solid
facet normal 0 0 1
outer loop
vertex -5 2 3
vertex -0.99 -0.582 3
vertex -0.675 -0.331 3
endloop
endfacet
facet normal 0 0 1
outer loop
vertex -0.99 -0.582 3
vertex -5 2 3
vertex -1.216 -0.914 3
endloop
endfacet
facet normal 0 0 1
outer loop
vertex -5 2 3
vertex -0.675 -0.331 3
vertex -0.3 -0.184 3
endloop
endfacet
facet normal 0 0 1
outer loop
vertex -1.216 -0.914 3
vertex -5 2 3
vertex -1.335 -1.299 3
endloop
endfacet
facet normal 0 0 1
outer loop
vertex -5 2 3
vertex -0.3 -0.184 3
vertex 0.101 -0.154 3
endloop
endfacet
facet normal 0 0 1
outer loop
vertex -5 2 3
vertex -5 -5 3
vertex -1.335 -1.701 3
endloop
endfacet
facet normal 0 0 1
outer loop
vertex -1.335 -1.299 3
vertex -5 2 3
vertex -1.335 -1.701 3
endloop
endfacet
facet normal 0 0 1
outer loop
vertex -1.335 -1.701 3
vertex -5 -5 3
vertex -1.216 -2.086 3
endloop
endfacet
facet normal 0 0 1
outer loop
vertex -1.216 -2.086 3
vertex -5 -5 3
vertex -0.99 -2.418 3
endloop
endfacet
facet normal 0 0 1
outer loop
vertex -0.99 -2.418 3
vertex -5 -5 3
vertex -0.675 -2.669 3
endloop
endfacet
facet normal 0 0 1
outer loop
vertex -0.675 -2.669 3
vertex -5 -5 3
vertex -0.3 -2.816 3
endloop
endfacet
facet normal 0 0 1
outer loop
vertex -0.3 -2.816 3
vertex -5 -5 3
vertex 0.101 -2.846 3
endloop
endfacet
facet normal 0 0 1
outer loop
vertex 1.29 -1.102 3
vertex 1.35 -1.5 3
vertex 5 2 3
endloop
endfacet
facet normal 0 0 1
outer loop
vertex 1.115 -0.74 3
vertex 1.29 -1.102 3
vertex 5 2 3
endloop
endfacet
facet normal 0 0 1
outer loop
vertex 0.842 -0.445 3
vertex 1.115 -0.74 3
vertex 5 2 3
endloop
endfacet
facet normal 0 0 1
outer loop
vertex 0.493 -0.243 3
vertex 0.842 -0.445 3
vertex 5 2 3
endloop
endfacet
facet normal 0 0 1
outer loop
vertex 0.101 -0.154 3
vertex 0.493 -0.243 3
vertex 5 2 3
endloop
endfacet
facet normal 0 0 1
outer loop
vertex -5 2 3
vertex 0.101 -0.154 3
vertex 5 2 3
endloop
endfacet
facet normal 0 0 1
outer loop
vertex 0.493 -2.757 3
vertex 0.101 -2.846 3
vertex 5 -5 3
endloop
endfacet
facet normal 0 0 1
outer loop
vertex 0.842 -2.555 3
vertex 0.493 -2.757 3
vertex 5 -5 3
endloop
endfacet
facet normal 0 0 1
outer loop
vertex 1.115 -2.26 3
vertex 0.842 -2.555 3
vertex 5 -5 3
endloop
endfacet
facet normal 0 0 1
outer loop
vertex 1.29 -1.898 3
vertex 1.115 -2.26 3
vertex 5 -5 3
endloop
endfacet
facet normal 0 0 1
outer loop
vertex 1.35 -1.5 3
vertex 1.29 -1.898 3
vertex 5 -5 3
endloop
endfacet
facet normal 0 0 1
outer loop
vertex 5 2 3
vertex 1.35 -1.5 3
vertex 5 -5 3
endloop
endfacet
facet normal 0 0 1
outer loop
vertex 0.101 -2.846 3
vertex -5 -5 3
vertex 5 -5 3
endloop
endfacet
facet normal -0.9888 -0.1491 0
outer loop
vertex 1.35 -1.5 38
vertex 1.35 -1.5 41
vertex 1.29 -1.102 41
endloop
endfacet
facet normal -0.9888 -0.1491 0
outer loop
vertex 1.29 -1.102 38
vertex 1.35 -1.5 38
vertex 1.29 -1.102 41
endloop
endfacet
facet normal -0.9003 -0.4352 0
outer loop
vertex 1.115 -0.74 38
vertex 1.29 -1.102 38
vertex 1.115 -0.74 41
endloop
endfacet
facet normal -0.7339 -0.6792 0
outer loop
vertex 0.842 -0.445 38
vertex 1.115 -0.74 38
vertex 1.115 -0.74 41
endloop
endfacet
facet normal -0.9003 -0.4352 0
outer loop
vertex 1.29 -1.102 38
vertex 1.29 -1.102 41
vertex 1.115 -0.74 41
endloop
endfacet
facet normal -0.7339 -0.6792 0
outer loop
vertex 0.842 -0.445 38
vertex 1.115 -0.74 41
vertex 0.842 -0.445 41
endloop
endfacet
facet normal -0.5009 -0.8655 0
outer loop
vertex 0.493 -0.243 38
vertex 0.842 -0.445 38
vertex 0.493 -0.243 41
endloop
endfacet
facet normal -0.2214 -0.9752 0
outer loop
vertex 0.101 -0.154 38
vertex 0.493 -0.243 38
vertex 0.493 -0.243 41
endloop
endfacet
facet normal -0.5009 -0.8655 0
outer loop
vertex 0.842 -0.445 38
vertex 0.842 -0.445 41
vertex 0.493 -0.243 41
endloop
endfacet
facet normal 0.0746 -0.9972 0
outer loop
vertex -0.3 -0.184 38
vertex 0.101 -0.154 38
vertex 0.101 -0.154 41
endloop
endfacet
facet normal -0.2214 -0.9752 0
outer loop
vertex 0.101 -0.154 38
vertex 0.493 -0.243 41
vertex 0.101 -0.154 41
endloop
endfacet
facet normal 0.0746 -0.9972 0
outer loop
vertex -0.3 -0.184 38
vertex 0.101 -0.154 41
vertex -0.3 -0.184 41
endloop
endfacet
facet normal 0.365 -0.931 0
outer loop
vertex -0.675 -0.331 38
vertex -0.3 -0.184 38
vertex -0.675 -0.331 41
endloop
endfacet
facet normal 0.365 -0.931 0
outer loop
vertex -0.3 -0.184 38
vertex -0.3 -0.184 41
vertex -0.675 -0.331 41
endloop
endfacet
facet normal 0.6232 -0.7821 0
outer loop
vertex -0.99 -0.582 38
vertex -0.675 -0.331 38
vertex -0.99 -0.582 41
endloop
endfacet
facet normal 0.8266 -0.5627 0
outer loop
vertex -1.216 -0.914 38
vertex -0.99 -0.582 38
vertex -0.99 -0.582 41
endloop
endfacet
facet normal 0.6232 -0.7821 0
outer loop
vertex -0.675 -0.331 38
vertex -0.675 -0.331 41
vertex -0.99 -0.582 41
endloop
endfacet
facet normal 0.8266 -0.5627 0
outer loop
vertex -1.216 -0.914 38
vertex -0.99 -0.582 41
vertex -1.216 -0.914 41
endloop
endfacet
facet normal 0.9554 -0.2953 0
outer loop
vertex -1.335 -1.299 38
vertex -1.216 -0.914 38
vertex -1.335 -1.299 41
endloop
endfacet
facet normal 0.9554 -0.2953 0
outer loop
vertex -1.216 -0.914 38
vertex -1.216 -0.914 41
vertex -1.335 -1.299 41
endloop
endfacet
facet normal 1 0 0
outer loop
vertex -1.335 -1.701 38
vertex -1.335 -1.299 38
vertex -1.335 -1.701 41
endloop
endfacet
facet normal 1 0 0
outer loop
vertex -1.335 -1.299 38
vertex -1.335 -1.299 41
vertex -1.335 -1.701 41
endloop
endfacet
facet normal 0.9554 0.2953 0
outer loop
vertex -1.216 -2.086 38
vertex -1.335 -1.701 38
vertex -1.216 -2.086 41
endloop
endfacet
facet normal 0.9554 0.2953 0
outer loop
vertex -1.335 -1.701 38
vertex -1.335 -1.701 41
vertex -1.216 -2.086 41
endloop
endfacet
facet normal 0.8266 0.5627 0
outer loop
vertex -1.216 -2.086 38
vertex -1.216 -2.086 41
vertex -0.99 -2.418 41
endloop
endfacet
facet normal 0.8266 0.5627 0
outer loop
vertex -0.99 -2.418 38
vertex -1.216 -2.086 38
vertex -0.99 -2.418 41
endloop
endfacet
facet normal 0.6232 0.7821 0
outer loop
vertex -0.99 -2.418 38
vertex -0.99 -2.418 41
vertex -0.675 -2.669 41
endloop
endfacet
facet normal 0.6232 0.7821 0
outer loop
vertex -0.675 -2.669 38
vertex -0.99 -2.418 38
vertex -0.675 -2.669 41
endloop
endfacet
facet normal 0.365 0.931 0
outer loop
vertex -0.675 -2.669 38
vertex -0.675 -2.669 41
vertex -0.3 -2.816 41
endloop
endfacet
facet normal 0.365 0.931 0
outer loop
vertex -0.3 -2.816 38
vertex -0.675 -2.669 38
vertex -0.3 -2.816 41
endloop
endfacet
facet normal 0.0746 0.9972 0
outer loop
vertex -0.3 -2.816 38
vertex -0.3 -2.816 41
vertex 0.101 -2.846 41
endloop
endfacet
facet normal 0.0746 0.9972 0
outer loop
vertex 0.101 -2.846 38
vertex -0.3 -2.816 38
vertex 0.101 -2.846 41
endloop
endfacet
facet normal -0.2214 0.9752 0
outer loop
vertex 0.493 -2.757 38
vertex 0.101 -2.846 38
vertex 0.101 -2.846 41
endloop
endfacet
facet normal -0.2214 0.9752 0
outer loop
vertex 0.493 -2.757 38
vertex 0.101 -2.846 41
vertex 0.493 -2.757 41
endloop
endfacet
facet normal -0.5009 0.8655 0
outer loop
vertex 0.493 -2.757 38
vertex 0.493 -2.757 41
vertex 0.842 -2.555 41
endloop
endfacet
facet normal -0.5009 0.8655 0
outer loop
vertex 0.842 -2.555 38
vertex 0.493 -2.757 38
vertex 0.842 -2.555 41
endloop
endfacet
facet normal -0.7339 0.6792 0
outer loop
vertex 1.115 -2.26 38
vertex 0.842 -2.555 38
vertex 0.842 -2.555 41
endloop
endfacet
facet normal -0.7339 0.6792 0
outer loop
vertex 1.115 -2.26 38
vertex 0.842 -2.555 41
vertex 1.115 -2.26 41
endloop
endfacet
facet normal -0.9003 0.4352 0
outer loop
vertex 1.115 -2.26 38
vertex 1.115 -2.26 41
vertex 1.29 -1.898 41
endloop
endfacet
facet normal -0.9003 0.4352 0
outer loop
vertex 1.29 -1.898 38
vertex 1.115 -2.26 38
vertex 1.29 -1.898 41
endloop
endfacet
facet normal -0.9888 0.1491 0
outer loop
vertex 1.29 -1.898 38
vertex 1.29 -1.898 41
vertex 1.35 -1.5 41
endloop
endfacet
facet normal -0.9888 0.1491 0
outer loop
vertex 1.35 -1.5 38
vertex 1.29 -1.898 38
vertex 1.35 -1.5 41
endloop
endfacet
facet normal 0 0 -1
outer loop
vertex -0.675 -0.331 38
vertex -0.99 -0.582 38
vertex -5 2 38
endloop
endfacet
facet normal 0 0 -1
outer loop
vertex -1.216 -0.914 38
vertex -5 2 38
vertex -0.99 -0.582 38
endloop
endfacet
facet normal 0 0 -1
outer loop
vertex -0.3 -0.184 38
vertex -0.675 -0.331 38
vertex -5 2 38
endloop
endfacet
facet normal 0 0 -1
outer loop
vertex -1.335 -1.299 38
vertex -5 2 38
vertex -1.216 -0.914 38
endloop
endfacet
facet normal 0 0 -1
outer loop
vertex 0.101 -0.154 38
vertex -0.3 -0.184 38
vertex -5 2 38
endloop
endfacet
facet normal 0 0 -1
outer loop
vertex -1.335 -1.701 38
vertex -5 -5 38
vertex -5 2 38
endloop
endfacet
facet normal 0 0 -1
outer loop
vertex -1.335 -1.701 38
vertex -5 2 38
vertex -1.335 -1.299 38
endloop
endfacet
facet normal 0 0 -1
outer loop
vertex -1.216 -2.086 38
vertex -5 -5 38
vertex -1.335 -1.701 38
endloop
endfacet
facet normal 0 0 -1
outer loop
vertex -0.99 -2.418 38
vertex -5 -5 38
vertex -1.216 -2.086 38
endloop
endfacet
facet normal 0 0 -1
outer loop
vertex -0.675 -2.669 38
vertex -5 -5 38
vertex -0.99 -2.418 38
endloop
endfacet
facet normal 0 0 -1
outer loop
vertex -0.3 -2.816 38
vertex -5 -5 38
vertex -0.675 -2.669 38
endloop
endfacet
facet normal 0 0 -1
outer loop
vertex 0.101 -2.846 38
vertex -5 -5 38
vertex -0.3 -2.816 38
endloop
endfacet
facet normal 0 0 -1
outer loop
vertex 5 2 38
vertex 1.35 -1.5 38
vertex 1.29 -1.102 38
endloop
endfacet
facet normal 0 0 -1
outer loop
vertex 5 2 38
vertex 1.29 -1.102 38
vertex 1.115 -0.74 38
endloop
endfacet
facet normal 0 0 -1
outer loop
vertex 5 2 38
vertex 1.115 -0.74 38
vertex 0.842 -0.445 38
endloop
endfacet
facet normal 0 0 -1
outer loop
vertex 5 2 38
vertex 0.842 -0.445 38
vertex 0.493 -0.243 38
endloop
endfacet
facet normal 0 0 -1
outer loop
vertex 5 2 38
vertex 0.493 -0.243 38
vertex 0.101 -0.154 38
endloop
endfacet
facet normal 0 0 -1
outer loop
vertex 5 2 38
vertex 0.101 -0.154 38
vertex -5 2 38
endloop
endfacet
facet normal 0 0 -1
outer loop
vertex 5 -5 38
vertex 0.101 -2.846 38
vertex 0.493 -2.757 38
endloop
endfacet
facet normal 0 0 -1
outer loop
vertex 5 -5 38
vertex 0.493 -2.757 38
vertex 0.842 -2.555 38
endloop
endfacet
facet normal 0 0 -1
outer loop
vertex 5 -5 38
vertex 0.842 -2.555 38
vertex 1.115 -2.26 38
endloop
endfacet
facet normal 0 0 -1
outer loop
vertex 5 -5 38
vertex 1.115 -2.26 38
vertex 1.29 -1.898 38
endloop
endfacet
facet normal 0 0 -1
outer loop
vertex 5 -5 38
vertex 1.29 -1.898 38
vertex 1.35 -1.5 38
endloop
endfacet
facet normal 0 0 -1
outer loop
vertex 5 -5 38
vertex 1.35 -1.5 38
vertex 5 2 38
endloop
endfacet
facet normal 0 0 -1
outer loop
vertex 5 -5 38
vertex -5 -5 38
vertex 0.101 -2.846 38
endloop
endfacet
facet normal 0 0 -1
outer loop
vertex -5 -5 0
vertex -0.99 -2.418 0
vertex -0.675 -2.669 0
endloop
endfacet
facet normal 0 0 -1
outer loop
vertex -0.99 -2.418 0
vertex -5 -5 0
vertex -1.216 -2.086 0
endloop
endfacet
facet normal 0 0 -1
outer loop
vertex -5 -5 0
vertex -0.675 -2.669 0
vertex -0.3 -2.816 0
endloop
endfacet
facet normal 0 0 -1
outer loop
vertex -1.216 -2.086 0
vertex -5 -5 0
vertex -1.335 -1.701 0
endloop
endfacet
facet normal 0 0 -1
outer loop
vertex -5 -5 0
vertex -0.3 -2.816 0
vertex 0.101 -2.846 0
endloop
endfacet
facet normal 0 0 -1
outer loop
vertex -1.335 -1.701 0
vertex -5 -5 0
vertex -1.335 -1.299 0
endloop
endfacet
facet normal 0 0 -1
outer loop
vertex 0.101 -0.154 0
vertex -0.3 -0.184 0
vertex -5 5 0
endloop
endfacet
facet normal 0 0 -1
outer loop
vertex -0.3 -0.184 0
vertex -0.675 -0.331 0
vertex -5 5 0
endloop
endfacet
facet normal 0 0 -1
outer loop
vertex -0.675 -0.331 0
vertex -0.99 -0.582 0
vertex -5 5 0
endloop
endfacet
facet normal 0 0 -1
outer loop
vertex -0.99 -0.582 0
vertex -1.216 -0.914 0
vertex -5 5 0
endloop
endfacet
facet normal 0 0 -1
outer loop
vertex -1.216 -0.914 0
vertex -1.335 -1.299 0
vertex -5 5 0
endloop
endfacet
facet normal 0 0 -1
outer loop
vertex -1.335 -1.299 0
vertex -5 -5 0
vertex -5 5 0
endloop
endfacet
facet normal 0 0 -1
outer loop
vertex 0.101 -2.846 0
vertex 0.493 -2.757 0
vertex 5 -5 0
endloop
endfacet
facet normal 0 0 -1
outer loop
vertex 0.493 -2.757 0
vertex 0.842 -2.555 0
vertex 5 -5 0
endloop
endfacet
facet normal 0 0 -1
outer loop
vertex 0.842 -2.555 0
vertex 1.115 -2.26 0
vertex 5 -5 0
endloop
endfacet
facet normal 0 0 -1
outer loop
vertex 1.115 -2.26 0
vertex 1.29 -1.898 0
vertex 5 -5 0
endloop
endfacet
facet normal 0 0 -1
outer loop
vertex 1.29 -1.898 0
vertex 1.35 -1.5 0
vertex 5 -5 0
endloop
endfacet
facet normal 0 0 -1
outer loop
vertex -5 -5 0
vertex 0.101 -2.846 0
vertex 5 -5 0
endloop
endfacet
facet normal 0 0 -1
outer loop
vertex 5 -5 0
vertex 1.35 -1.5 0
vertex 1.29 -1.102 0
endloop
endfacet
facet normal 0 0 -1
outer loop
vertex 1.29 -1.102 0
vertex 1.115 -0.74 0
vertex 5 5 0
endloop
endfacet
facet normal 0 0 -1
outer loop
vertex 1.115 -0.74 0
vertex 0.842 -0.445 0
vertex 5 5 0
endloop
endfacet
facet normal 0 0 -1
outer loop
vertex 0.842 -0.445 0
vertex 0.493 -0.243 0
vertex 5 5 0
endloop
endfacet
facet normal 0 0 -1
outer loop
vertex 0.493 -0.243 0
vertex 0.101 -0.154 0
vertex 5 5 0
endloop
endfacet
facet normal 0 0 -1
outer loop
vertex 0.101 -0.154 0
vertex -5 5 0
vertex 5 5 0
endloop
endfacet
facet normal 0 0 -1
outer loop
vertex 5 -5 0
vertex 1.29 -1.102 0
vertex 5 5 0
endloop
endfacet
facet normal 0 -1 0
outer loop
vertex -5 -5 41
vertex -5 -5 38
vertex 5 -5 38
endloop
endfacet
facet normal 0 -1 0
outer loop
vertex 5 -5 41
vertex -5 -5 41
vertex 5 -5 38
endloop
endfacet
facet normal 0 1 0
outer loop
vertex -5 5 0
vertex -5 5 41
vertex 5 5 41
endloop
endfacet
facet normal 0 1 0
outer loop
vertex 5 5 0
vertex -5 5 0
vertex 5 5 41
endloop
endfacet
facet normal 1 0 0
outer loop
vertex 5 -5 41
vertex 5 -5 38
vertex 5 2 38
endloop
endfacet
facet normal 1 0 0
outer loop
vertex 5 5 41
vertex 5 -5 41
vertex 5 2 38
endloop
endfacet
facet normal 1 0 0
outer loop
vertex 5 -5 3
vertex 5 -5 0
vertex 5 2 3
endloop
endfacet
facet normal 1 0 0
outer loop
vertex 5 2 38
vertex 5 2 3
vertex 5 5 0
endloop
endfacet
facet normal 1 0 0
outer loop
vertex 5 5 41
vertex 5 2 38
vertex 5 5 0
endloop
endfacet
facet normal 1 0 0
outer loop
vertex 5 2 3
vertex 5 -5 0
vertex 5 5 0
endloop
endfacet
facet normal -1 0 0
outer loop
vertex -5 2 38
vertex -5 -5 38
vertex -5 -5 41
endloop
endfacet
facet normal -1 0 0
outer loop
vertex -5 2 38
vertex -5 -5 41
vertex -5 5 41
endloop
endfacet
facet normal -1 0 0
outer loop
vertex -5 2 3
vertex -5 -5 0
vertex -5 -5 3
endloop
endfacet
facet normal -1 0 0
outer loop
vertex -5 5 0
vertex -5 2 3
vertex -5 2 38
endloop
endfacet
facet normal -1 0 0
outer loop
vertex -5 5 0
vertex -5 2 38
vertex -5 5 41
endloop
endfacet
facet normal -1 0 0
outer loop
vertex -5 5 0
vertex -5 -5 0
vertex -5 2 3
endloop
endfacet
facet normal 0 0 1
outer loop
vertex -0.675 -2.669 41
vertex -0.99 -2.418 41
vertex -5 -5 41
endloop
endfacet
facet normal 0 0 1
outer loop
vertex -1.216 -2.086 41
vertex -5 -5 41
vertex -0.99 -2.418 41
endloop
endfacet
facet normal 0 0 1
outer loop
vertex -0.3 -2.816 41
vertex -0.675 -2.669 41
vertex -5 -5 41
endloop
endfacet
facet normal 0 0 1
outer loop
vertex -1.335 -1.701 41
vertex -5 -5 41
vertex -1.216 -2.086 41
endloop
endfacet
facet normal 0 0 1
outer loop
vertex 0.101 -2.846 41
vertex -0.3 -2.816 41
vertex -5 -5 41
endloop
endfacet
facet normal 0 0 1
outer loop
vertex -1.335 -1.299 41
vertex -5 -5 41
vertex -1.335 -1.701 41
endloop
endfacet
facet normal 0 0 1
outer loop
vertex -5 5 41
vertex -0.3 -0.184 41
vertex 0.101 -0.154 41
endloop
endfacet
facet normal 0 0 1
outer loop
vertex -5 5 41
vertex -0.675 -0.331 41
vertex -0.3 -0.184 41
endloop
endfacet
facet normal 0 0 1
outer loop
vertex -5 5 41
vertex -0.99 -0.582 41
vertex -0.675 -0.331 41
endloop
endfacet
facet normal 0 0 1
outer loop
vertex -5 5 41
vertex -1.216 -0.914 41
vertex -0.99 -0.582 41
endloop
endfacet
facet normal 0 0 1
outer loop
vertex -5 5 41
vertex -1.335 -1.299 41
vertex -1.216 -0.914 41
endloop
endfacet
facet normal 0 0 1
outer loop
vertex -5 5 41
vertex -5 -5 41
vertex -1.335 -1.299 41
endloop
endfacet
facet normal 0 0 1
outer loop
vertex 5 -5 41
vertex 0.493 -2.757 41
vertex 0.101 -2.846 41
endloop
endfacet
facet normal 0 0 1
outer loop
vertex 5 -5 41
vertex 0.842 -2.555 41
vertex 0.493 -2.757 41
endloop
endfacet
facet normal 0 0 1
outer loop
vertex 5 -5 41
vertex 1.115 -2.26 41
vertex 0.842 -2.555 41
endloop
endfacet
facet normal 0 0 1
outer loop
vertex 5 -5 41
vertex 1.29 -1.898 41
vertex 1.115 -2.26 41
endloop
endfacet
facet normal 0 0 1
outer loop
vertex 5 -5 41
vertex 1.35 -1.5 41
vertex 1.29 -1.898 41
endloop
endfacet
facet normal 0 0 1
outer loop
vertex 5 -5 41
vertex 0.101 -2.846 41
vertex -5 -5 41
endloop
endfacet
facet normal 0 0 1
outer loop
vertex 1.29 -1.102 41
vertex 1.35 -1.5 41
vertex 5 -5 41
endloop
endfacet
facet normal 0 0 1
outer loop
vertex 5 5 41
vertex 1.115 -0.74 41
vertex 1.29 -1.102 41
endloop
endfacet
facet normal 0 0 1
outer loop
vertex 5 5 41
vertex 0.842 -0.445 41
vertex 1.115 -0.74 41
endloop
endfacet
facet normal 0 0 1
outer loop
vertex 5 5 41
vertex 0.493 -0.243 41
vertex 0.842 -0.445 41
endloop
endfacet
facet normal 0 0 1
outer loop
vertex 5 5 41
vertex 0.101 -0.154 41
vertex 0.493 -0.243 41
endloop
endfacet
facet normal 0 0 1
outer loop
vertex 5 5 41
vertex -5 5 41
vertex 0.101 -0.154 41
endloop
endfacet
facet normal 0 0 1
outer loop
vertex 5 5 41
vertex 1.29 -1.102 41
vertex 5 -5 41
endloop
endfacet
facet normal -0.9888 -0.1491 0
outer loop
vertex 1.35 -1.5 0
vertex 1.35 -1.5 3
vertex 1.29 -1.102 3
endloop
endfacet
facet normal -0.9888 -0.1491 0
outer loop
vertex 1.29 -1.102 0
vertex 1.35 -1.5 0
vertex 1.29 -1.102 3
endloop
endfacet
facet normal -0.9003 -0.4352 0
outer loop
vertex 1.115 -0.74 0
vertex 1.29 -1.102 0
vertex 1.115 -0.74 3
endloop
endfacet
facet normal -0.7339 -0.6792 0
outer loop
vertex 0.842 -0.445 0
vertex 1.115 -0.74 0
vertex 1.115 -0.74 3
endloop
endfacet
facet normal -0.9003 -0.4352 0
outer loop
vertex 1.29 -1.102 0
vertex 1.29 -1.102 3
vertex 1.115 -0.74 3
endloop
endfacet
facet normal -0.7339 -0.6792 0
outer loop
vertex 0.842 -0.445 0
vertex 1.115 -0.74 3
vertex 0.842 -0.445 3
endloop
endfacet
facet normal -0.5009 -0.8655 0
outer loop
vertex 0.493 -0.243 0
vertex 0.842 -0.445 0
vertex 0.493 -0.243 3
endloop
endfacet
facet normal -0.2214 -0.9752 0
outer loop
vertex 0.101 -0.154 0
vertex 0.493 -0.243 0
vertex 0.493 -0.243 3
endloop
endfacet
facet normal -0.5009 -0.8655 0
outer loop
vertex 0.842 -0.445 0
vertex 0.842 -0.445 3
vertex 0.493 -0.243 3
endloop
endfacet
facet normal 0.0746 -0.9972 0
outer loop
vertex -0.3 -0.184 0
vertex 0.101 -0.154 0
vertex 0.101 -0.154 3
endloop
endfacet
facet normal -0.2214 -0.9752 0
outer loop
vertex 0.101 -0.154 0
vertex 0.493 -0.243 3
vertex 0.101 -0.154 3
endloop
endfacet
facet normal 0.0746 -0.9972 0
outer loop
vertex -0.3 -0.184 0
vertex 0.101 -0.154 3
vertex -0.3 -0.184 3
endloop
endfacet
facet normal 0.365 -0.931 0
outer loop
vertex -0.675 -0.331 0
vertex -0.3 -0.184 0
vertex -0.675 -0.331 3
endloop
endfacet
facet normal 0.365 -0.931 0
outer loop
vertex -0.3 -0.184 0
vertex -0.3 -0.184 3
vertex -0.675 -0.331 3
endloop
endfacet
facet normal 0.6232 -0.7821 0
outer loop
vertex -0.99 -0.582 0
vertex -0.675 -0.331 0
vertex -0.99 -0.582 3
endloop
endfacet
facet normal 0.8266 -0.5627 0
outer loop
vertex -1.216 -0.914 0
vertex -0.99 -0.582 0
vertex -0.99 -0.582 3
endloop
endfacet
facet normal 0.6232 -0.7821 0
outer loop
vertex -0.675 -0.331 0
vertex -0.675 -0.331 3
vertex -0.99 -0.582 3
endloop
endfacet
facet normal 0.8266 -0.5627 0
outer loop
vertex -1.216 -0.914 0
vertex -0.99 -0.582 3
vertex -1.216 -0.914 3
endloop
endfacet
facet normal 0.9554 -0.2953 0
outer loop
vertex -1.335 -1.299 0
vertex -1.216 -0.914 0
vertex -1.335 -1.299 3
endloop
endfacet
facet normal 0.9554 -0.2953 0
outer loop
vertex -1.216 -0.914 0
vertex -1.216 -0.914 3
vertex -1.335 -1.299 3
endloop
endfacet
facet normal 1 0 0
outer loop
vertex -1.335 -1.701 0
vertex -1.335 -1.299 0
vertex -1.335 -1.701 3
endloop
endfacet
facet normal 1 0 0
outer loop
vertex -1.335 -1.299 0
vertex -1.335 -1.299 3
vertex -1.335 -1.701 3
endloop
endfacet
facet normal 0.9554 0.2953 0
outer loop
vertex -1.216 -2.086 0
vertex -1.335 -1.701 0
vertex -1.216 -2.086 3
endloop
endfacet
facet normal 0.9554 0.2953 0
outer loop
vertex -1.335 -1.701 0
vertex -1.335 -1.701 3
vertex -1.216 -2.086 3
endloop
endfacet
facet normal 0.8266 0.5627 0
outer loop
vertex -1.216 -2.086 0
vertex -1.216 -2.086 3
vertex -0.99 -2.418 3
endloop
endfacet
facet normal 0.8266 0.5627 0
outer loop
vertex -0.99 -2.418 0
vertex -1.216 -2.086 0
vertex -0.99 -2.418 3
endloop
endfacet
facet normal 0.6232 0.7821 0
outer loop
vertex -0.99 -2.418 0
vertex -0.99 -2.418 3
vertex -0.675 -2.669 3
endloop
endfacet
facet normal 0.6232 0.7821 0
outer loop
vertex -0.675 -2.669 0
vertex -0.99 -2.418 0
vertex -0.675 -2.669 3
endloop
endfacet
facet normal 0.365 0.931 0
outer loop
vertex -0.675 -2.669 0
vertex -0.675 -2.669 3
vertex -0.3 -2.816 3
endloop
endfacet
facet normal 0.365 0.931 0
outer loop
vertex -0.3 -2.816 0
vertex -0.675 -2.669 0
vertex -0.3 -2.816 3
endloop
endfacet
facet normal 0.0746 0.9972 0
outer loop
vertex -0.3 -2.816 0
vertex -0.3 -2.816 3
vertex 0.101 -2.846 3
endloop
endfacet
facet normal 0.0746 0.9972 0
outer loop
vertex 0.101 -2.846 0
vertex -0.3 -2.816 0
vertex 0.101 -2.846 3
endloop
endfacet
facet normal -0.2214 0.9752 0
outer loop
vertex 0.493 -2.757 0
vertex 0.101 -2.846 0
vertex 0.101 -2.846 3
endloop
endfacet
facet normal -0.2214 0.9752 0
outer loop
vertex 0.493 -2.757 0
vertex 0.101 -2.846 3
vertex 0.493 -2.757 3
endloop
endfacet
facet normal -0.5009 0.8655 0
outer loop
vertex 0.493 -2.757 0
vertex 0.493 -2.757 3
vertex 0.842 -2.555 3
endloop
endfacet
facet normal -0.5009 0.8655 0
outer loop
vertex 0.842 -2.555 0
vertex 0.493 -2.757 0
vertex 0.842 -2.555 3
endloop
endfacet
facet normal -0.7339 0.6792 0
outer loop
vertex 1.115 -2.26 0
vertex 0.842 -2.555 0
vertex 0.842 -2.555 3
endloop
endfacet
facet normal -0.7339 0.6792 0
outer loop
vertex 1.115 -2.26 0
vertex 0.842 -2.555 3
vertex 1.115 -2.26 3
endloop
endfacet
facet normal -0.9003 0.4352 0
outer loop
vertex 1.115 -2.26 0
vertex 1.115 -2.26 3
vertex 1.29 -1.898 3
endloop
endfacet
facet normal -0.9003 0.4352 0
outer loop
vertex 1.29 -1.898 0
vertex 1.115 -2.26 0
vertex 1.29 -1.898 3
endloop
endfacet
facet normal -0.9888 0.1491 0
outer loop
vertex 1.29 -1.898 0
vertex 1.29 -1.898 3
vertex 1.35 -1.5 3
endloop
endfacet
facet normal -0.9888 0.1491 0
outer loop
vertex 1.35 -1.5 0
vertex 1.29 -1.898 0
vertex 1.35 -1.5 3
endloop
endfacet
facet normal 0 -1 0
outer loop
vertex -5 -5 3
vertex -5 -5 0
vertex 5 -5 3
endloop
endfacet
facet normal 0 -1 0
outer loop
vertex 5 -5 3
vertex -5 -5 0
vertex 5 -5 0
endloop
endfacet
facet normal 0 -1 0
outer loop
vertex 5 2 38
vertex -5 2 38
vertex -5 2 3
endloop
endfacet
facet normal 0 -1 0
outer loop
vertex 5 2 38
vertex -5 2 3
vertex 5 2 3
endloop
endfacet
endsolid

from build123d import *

# Parameters (mm, degrees)
F0_W     = 10
F0_H     = 10
F1_DEPTH = 41
F2_W     = 10
F2_H     = 35
F3_DEPTH = 7
F4_R     = 1.35
F5_DEPTH = 50


with BuildPart() as f1:
    # F0 (on Top) → F1 (new body)
    with BuildSketch(Plane.XY):
        Rectangle(F0_W, F0_H)
    extrude(amount=F1_DEPTH)

    # F2 (on face) → F3 (cut)
    with BuildSketch(Plane.XZ.offset(5)):
        with Locations((0, 20.5)):
            Rectangle(F2_W, F2_H)
    extrude(amount=-F3_DEPTH, mode=Mode.SUBTRACT)

    # F4 (on face) → F5 (cut)
    with BuildSketch(Plane.XY.offset(41)):
        with Locations((0, -1.5)):
            Circle(F4_R)
    extrude(amount=-F5_DEPTH, mode=Mode.SUBTRACT)


solid = f1.part
